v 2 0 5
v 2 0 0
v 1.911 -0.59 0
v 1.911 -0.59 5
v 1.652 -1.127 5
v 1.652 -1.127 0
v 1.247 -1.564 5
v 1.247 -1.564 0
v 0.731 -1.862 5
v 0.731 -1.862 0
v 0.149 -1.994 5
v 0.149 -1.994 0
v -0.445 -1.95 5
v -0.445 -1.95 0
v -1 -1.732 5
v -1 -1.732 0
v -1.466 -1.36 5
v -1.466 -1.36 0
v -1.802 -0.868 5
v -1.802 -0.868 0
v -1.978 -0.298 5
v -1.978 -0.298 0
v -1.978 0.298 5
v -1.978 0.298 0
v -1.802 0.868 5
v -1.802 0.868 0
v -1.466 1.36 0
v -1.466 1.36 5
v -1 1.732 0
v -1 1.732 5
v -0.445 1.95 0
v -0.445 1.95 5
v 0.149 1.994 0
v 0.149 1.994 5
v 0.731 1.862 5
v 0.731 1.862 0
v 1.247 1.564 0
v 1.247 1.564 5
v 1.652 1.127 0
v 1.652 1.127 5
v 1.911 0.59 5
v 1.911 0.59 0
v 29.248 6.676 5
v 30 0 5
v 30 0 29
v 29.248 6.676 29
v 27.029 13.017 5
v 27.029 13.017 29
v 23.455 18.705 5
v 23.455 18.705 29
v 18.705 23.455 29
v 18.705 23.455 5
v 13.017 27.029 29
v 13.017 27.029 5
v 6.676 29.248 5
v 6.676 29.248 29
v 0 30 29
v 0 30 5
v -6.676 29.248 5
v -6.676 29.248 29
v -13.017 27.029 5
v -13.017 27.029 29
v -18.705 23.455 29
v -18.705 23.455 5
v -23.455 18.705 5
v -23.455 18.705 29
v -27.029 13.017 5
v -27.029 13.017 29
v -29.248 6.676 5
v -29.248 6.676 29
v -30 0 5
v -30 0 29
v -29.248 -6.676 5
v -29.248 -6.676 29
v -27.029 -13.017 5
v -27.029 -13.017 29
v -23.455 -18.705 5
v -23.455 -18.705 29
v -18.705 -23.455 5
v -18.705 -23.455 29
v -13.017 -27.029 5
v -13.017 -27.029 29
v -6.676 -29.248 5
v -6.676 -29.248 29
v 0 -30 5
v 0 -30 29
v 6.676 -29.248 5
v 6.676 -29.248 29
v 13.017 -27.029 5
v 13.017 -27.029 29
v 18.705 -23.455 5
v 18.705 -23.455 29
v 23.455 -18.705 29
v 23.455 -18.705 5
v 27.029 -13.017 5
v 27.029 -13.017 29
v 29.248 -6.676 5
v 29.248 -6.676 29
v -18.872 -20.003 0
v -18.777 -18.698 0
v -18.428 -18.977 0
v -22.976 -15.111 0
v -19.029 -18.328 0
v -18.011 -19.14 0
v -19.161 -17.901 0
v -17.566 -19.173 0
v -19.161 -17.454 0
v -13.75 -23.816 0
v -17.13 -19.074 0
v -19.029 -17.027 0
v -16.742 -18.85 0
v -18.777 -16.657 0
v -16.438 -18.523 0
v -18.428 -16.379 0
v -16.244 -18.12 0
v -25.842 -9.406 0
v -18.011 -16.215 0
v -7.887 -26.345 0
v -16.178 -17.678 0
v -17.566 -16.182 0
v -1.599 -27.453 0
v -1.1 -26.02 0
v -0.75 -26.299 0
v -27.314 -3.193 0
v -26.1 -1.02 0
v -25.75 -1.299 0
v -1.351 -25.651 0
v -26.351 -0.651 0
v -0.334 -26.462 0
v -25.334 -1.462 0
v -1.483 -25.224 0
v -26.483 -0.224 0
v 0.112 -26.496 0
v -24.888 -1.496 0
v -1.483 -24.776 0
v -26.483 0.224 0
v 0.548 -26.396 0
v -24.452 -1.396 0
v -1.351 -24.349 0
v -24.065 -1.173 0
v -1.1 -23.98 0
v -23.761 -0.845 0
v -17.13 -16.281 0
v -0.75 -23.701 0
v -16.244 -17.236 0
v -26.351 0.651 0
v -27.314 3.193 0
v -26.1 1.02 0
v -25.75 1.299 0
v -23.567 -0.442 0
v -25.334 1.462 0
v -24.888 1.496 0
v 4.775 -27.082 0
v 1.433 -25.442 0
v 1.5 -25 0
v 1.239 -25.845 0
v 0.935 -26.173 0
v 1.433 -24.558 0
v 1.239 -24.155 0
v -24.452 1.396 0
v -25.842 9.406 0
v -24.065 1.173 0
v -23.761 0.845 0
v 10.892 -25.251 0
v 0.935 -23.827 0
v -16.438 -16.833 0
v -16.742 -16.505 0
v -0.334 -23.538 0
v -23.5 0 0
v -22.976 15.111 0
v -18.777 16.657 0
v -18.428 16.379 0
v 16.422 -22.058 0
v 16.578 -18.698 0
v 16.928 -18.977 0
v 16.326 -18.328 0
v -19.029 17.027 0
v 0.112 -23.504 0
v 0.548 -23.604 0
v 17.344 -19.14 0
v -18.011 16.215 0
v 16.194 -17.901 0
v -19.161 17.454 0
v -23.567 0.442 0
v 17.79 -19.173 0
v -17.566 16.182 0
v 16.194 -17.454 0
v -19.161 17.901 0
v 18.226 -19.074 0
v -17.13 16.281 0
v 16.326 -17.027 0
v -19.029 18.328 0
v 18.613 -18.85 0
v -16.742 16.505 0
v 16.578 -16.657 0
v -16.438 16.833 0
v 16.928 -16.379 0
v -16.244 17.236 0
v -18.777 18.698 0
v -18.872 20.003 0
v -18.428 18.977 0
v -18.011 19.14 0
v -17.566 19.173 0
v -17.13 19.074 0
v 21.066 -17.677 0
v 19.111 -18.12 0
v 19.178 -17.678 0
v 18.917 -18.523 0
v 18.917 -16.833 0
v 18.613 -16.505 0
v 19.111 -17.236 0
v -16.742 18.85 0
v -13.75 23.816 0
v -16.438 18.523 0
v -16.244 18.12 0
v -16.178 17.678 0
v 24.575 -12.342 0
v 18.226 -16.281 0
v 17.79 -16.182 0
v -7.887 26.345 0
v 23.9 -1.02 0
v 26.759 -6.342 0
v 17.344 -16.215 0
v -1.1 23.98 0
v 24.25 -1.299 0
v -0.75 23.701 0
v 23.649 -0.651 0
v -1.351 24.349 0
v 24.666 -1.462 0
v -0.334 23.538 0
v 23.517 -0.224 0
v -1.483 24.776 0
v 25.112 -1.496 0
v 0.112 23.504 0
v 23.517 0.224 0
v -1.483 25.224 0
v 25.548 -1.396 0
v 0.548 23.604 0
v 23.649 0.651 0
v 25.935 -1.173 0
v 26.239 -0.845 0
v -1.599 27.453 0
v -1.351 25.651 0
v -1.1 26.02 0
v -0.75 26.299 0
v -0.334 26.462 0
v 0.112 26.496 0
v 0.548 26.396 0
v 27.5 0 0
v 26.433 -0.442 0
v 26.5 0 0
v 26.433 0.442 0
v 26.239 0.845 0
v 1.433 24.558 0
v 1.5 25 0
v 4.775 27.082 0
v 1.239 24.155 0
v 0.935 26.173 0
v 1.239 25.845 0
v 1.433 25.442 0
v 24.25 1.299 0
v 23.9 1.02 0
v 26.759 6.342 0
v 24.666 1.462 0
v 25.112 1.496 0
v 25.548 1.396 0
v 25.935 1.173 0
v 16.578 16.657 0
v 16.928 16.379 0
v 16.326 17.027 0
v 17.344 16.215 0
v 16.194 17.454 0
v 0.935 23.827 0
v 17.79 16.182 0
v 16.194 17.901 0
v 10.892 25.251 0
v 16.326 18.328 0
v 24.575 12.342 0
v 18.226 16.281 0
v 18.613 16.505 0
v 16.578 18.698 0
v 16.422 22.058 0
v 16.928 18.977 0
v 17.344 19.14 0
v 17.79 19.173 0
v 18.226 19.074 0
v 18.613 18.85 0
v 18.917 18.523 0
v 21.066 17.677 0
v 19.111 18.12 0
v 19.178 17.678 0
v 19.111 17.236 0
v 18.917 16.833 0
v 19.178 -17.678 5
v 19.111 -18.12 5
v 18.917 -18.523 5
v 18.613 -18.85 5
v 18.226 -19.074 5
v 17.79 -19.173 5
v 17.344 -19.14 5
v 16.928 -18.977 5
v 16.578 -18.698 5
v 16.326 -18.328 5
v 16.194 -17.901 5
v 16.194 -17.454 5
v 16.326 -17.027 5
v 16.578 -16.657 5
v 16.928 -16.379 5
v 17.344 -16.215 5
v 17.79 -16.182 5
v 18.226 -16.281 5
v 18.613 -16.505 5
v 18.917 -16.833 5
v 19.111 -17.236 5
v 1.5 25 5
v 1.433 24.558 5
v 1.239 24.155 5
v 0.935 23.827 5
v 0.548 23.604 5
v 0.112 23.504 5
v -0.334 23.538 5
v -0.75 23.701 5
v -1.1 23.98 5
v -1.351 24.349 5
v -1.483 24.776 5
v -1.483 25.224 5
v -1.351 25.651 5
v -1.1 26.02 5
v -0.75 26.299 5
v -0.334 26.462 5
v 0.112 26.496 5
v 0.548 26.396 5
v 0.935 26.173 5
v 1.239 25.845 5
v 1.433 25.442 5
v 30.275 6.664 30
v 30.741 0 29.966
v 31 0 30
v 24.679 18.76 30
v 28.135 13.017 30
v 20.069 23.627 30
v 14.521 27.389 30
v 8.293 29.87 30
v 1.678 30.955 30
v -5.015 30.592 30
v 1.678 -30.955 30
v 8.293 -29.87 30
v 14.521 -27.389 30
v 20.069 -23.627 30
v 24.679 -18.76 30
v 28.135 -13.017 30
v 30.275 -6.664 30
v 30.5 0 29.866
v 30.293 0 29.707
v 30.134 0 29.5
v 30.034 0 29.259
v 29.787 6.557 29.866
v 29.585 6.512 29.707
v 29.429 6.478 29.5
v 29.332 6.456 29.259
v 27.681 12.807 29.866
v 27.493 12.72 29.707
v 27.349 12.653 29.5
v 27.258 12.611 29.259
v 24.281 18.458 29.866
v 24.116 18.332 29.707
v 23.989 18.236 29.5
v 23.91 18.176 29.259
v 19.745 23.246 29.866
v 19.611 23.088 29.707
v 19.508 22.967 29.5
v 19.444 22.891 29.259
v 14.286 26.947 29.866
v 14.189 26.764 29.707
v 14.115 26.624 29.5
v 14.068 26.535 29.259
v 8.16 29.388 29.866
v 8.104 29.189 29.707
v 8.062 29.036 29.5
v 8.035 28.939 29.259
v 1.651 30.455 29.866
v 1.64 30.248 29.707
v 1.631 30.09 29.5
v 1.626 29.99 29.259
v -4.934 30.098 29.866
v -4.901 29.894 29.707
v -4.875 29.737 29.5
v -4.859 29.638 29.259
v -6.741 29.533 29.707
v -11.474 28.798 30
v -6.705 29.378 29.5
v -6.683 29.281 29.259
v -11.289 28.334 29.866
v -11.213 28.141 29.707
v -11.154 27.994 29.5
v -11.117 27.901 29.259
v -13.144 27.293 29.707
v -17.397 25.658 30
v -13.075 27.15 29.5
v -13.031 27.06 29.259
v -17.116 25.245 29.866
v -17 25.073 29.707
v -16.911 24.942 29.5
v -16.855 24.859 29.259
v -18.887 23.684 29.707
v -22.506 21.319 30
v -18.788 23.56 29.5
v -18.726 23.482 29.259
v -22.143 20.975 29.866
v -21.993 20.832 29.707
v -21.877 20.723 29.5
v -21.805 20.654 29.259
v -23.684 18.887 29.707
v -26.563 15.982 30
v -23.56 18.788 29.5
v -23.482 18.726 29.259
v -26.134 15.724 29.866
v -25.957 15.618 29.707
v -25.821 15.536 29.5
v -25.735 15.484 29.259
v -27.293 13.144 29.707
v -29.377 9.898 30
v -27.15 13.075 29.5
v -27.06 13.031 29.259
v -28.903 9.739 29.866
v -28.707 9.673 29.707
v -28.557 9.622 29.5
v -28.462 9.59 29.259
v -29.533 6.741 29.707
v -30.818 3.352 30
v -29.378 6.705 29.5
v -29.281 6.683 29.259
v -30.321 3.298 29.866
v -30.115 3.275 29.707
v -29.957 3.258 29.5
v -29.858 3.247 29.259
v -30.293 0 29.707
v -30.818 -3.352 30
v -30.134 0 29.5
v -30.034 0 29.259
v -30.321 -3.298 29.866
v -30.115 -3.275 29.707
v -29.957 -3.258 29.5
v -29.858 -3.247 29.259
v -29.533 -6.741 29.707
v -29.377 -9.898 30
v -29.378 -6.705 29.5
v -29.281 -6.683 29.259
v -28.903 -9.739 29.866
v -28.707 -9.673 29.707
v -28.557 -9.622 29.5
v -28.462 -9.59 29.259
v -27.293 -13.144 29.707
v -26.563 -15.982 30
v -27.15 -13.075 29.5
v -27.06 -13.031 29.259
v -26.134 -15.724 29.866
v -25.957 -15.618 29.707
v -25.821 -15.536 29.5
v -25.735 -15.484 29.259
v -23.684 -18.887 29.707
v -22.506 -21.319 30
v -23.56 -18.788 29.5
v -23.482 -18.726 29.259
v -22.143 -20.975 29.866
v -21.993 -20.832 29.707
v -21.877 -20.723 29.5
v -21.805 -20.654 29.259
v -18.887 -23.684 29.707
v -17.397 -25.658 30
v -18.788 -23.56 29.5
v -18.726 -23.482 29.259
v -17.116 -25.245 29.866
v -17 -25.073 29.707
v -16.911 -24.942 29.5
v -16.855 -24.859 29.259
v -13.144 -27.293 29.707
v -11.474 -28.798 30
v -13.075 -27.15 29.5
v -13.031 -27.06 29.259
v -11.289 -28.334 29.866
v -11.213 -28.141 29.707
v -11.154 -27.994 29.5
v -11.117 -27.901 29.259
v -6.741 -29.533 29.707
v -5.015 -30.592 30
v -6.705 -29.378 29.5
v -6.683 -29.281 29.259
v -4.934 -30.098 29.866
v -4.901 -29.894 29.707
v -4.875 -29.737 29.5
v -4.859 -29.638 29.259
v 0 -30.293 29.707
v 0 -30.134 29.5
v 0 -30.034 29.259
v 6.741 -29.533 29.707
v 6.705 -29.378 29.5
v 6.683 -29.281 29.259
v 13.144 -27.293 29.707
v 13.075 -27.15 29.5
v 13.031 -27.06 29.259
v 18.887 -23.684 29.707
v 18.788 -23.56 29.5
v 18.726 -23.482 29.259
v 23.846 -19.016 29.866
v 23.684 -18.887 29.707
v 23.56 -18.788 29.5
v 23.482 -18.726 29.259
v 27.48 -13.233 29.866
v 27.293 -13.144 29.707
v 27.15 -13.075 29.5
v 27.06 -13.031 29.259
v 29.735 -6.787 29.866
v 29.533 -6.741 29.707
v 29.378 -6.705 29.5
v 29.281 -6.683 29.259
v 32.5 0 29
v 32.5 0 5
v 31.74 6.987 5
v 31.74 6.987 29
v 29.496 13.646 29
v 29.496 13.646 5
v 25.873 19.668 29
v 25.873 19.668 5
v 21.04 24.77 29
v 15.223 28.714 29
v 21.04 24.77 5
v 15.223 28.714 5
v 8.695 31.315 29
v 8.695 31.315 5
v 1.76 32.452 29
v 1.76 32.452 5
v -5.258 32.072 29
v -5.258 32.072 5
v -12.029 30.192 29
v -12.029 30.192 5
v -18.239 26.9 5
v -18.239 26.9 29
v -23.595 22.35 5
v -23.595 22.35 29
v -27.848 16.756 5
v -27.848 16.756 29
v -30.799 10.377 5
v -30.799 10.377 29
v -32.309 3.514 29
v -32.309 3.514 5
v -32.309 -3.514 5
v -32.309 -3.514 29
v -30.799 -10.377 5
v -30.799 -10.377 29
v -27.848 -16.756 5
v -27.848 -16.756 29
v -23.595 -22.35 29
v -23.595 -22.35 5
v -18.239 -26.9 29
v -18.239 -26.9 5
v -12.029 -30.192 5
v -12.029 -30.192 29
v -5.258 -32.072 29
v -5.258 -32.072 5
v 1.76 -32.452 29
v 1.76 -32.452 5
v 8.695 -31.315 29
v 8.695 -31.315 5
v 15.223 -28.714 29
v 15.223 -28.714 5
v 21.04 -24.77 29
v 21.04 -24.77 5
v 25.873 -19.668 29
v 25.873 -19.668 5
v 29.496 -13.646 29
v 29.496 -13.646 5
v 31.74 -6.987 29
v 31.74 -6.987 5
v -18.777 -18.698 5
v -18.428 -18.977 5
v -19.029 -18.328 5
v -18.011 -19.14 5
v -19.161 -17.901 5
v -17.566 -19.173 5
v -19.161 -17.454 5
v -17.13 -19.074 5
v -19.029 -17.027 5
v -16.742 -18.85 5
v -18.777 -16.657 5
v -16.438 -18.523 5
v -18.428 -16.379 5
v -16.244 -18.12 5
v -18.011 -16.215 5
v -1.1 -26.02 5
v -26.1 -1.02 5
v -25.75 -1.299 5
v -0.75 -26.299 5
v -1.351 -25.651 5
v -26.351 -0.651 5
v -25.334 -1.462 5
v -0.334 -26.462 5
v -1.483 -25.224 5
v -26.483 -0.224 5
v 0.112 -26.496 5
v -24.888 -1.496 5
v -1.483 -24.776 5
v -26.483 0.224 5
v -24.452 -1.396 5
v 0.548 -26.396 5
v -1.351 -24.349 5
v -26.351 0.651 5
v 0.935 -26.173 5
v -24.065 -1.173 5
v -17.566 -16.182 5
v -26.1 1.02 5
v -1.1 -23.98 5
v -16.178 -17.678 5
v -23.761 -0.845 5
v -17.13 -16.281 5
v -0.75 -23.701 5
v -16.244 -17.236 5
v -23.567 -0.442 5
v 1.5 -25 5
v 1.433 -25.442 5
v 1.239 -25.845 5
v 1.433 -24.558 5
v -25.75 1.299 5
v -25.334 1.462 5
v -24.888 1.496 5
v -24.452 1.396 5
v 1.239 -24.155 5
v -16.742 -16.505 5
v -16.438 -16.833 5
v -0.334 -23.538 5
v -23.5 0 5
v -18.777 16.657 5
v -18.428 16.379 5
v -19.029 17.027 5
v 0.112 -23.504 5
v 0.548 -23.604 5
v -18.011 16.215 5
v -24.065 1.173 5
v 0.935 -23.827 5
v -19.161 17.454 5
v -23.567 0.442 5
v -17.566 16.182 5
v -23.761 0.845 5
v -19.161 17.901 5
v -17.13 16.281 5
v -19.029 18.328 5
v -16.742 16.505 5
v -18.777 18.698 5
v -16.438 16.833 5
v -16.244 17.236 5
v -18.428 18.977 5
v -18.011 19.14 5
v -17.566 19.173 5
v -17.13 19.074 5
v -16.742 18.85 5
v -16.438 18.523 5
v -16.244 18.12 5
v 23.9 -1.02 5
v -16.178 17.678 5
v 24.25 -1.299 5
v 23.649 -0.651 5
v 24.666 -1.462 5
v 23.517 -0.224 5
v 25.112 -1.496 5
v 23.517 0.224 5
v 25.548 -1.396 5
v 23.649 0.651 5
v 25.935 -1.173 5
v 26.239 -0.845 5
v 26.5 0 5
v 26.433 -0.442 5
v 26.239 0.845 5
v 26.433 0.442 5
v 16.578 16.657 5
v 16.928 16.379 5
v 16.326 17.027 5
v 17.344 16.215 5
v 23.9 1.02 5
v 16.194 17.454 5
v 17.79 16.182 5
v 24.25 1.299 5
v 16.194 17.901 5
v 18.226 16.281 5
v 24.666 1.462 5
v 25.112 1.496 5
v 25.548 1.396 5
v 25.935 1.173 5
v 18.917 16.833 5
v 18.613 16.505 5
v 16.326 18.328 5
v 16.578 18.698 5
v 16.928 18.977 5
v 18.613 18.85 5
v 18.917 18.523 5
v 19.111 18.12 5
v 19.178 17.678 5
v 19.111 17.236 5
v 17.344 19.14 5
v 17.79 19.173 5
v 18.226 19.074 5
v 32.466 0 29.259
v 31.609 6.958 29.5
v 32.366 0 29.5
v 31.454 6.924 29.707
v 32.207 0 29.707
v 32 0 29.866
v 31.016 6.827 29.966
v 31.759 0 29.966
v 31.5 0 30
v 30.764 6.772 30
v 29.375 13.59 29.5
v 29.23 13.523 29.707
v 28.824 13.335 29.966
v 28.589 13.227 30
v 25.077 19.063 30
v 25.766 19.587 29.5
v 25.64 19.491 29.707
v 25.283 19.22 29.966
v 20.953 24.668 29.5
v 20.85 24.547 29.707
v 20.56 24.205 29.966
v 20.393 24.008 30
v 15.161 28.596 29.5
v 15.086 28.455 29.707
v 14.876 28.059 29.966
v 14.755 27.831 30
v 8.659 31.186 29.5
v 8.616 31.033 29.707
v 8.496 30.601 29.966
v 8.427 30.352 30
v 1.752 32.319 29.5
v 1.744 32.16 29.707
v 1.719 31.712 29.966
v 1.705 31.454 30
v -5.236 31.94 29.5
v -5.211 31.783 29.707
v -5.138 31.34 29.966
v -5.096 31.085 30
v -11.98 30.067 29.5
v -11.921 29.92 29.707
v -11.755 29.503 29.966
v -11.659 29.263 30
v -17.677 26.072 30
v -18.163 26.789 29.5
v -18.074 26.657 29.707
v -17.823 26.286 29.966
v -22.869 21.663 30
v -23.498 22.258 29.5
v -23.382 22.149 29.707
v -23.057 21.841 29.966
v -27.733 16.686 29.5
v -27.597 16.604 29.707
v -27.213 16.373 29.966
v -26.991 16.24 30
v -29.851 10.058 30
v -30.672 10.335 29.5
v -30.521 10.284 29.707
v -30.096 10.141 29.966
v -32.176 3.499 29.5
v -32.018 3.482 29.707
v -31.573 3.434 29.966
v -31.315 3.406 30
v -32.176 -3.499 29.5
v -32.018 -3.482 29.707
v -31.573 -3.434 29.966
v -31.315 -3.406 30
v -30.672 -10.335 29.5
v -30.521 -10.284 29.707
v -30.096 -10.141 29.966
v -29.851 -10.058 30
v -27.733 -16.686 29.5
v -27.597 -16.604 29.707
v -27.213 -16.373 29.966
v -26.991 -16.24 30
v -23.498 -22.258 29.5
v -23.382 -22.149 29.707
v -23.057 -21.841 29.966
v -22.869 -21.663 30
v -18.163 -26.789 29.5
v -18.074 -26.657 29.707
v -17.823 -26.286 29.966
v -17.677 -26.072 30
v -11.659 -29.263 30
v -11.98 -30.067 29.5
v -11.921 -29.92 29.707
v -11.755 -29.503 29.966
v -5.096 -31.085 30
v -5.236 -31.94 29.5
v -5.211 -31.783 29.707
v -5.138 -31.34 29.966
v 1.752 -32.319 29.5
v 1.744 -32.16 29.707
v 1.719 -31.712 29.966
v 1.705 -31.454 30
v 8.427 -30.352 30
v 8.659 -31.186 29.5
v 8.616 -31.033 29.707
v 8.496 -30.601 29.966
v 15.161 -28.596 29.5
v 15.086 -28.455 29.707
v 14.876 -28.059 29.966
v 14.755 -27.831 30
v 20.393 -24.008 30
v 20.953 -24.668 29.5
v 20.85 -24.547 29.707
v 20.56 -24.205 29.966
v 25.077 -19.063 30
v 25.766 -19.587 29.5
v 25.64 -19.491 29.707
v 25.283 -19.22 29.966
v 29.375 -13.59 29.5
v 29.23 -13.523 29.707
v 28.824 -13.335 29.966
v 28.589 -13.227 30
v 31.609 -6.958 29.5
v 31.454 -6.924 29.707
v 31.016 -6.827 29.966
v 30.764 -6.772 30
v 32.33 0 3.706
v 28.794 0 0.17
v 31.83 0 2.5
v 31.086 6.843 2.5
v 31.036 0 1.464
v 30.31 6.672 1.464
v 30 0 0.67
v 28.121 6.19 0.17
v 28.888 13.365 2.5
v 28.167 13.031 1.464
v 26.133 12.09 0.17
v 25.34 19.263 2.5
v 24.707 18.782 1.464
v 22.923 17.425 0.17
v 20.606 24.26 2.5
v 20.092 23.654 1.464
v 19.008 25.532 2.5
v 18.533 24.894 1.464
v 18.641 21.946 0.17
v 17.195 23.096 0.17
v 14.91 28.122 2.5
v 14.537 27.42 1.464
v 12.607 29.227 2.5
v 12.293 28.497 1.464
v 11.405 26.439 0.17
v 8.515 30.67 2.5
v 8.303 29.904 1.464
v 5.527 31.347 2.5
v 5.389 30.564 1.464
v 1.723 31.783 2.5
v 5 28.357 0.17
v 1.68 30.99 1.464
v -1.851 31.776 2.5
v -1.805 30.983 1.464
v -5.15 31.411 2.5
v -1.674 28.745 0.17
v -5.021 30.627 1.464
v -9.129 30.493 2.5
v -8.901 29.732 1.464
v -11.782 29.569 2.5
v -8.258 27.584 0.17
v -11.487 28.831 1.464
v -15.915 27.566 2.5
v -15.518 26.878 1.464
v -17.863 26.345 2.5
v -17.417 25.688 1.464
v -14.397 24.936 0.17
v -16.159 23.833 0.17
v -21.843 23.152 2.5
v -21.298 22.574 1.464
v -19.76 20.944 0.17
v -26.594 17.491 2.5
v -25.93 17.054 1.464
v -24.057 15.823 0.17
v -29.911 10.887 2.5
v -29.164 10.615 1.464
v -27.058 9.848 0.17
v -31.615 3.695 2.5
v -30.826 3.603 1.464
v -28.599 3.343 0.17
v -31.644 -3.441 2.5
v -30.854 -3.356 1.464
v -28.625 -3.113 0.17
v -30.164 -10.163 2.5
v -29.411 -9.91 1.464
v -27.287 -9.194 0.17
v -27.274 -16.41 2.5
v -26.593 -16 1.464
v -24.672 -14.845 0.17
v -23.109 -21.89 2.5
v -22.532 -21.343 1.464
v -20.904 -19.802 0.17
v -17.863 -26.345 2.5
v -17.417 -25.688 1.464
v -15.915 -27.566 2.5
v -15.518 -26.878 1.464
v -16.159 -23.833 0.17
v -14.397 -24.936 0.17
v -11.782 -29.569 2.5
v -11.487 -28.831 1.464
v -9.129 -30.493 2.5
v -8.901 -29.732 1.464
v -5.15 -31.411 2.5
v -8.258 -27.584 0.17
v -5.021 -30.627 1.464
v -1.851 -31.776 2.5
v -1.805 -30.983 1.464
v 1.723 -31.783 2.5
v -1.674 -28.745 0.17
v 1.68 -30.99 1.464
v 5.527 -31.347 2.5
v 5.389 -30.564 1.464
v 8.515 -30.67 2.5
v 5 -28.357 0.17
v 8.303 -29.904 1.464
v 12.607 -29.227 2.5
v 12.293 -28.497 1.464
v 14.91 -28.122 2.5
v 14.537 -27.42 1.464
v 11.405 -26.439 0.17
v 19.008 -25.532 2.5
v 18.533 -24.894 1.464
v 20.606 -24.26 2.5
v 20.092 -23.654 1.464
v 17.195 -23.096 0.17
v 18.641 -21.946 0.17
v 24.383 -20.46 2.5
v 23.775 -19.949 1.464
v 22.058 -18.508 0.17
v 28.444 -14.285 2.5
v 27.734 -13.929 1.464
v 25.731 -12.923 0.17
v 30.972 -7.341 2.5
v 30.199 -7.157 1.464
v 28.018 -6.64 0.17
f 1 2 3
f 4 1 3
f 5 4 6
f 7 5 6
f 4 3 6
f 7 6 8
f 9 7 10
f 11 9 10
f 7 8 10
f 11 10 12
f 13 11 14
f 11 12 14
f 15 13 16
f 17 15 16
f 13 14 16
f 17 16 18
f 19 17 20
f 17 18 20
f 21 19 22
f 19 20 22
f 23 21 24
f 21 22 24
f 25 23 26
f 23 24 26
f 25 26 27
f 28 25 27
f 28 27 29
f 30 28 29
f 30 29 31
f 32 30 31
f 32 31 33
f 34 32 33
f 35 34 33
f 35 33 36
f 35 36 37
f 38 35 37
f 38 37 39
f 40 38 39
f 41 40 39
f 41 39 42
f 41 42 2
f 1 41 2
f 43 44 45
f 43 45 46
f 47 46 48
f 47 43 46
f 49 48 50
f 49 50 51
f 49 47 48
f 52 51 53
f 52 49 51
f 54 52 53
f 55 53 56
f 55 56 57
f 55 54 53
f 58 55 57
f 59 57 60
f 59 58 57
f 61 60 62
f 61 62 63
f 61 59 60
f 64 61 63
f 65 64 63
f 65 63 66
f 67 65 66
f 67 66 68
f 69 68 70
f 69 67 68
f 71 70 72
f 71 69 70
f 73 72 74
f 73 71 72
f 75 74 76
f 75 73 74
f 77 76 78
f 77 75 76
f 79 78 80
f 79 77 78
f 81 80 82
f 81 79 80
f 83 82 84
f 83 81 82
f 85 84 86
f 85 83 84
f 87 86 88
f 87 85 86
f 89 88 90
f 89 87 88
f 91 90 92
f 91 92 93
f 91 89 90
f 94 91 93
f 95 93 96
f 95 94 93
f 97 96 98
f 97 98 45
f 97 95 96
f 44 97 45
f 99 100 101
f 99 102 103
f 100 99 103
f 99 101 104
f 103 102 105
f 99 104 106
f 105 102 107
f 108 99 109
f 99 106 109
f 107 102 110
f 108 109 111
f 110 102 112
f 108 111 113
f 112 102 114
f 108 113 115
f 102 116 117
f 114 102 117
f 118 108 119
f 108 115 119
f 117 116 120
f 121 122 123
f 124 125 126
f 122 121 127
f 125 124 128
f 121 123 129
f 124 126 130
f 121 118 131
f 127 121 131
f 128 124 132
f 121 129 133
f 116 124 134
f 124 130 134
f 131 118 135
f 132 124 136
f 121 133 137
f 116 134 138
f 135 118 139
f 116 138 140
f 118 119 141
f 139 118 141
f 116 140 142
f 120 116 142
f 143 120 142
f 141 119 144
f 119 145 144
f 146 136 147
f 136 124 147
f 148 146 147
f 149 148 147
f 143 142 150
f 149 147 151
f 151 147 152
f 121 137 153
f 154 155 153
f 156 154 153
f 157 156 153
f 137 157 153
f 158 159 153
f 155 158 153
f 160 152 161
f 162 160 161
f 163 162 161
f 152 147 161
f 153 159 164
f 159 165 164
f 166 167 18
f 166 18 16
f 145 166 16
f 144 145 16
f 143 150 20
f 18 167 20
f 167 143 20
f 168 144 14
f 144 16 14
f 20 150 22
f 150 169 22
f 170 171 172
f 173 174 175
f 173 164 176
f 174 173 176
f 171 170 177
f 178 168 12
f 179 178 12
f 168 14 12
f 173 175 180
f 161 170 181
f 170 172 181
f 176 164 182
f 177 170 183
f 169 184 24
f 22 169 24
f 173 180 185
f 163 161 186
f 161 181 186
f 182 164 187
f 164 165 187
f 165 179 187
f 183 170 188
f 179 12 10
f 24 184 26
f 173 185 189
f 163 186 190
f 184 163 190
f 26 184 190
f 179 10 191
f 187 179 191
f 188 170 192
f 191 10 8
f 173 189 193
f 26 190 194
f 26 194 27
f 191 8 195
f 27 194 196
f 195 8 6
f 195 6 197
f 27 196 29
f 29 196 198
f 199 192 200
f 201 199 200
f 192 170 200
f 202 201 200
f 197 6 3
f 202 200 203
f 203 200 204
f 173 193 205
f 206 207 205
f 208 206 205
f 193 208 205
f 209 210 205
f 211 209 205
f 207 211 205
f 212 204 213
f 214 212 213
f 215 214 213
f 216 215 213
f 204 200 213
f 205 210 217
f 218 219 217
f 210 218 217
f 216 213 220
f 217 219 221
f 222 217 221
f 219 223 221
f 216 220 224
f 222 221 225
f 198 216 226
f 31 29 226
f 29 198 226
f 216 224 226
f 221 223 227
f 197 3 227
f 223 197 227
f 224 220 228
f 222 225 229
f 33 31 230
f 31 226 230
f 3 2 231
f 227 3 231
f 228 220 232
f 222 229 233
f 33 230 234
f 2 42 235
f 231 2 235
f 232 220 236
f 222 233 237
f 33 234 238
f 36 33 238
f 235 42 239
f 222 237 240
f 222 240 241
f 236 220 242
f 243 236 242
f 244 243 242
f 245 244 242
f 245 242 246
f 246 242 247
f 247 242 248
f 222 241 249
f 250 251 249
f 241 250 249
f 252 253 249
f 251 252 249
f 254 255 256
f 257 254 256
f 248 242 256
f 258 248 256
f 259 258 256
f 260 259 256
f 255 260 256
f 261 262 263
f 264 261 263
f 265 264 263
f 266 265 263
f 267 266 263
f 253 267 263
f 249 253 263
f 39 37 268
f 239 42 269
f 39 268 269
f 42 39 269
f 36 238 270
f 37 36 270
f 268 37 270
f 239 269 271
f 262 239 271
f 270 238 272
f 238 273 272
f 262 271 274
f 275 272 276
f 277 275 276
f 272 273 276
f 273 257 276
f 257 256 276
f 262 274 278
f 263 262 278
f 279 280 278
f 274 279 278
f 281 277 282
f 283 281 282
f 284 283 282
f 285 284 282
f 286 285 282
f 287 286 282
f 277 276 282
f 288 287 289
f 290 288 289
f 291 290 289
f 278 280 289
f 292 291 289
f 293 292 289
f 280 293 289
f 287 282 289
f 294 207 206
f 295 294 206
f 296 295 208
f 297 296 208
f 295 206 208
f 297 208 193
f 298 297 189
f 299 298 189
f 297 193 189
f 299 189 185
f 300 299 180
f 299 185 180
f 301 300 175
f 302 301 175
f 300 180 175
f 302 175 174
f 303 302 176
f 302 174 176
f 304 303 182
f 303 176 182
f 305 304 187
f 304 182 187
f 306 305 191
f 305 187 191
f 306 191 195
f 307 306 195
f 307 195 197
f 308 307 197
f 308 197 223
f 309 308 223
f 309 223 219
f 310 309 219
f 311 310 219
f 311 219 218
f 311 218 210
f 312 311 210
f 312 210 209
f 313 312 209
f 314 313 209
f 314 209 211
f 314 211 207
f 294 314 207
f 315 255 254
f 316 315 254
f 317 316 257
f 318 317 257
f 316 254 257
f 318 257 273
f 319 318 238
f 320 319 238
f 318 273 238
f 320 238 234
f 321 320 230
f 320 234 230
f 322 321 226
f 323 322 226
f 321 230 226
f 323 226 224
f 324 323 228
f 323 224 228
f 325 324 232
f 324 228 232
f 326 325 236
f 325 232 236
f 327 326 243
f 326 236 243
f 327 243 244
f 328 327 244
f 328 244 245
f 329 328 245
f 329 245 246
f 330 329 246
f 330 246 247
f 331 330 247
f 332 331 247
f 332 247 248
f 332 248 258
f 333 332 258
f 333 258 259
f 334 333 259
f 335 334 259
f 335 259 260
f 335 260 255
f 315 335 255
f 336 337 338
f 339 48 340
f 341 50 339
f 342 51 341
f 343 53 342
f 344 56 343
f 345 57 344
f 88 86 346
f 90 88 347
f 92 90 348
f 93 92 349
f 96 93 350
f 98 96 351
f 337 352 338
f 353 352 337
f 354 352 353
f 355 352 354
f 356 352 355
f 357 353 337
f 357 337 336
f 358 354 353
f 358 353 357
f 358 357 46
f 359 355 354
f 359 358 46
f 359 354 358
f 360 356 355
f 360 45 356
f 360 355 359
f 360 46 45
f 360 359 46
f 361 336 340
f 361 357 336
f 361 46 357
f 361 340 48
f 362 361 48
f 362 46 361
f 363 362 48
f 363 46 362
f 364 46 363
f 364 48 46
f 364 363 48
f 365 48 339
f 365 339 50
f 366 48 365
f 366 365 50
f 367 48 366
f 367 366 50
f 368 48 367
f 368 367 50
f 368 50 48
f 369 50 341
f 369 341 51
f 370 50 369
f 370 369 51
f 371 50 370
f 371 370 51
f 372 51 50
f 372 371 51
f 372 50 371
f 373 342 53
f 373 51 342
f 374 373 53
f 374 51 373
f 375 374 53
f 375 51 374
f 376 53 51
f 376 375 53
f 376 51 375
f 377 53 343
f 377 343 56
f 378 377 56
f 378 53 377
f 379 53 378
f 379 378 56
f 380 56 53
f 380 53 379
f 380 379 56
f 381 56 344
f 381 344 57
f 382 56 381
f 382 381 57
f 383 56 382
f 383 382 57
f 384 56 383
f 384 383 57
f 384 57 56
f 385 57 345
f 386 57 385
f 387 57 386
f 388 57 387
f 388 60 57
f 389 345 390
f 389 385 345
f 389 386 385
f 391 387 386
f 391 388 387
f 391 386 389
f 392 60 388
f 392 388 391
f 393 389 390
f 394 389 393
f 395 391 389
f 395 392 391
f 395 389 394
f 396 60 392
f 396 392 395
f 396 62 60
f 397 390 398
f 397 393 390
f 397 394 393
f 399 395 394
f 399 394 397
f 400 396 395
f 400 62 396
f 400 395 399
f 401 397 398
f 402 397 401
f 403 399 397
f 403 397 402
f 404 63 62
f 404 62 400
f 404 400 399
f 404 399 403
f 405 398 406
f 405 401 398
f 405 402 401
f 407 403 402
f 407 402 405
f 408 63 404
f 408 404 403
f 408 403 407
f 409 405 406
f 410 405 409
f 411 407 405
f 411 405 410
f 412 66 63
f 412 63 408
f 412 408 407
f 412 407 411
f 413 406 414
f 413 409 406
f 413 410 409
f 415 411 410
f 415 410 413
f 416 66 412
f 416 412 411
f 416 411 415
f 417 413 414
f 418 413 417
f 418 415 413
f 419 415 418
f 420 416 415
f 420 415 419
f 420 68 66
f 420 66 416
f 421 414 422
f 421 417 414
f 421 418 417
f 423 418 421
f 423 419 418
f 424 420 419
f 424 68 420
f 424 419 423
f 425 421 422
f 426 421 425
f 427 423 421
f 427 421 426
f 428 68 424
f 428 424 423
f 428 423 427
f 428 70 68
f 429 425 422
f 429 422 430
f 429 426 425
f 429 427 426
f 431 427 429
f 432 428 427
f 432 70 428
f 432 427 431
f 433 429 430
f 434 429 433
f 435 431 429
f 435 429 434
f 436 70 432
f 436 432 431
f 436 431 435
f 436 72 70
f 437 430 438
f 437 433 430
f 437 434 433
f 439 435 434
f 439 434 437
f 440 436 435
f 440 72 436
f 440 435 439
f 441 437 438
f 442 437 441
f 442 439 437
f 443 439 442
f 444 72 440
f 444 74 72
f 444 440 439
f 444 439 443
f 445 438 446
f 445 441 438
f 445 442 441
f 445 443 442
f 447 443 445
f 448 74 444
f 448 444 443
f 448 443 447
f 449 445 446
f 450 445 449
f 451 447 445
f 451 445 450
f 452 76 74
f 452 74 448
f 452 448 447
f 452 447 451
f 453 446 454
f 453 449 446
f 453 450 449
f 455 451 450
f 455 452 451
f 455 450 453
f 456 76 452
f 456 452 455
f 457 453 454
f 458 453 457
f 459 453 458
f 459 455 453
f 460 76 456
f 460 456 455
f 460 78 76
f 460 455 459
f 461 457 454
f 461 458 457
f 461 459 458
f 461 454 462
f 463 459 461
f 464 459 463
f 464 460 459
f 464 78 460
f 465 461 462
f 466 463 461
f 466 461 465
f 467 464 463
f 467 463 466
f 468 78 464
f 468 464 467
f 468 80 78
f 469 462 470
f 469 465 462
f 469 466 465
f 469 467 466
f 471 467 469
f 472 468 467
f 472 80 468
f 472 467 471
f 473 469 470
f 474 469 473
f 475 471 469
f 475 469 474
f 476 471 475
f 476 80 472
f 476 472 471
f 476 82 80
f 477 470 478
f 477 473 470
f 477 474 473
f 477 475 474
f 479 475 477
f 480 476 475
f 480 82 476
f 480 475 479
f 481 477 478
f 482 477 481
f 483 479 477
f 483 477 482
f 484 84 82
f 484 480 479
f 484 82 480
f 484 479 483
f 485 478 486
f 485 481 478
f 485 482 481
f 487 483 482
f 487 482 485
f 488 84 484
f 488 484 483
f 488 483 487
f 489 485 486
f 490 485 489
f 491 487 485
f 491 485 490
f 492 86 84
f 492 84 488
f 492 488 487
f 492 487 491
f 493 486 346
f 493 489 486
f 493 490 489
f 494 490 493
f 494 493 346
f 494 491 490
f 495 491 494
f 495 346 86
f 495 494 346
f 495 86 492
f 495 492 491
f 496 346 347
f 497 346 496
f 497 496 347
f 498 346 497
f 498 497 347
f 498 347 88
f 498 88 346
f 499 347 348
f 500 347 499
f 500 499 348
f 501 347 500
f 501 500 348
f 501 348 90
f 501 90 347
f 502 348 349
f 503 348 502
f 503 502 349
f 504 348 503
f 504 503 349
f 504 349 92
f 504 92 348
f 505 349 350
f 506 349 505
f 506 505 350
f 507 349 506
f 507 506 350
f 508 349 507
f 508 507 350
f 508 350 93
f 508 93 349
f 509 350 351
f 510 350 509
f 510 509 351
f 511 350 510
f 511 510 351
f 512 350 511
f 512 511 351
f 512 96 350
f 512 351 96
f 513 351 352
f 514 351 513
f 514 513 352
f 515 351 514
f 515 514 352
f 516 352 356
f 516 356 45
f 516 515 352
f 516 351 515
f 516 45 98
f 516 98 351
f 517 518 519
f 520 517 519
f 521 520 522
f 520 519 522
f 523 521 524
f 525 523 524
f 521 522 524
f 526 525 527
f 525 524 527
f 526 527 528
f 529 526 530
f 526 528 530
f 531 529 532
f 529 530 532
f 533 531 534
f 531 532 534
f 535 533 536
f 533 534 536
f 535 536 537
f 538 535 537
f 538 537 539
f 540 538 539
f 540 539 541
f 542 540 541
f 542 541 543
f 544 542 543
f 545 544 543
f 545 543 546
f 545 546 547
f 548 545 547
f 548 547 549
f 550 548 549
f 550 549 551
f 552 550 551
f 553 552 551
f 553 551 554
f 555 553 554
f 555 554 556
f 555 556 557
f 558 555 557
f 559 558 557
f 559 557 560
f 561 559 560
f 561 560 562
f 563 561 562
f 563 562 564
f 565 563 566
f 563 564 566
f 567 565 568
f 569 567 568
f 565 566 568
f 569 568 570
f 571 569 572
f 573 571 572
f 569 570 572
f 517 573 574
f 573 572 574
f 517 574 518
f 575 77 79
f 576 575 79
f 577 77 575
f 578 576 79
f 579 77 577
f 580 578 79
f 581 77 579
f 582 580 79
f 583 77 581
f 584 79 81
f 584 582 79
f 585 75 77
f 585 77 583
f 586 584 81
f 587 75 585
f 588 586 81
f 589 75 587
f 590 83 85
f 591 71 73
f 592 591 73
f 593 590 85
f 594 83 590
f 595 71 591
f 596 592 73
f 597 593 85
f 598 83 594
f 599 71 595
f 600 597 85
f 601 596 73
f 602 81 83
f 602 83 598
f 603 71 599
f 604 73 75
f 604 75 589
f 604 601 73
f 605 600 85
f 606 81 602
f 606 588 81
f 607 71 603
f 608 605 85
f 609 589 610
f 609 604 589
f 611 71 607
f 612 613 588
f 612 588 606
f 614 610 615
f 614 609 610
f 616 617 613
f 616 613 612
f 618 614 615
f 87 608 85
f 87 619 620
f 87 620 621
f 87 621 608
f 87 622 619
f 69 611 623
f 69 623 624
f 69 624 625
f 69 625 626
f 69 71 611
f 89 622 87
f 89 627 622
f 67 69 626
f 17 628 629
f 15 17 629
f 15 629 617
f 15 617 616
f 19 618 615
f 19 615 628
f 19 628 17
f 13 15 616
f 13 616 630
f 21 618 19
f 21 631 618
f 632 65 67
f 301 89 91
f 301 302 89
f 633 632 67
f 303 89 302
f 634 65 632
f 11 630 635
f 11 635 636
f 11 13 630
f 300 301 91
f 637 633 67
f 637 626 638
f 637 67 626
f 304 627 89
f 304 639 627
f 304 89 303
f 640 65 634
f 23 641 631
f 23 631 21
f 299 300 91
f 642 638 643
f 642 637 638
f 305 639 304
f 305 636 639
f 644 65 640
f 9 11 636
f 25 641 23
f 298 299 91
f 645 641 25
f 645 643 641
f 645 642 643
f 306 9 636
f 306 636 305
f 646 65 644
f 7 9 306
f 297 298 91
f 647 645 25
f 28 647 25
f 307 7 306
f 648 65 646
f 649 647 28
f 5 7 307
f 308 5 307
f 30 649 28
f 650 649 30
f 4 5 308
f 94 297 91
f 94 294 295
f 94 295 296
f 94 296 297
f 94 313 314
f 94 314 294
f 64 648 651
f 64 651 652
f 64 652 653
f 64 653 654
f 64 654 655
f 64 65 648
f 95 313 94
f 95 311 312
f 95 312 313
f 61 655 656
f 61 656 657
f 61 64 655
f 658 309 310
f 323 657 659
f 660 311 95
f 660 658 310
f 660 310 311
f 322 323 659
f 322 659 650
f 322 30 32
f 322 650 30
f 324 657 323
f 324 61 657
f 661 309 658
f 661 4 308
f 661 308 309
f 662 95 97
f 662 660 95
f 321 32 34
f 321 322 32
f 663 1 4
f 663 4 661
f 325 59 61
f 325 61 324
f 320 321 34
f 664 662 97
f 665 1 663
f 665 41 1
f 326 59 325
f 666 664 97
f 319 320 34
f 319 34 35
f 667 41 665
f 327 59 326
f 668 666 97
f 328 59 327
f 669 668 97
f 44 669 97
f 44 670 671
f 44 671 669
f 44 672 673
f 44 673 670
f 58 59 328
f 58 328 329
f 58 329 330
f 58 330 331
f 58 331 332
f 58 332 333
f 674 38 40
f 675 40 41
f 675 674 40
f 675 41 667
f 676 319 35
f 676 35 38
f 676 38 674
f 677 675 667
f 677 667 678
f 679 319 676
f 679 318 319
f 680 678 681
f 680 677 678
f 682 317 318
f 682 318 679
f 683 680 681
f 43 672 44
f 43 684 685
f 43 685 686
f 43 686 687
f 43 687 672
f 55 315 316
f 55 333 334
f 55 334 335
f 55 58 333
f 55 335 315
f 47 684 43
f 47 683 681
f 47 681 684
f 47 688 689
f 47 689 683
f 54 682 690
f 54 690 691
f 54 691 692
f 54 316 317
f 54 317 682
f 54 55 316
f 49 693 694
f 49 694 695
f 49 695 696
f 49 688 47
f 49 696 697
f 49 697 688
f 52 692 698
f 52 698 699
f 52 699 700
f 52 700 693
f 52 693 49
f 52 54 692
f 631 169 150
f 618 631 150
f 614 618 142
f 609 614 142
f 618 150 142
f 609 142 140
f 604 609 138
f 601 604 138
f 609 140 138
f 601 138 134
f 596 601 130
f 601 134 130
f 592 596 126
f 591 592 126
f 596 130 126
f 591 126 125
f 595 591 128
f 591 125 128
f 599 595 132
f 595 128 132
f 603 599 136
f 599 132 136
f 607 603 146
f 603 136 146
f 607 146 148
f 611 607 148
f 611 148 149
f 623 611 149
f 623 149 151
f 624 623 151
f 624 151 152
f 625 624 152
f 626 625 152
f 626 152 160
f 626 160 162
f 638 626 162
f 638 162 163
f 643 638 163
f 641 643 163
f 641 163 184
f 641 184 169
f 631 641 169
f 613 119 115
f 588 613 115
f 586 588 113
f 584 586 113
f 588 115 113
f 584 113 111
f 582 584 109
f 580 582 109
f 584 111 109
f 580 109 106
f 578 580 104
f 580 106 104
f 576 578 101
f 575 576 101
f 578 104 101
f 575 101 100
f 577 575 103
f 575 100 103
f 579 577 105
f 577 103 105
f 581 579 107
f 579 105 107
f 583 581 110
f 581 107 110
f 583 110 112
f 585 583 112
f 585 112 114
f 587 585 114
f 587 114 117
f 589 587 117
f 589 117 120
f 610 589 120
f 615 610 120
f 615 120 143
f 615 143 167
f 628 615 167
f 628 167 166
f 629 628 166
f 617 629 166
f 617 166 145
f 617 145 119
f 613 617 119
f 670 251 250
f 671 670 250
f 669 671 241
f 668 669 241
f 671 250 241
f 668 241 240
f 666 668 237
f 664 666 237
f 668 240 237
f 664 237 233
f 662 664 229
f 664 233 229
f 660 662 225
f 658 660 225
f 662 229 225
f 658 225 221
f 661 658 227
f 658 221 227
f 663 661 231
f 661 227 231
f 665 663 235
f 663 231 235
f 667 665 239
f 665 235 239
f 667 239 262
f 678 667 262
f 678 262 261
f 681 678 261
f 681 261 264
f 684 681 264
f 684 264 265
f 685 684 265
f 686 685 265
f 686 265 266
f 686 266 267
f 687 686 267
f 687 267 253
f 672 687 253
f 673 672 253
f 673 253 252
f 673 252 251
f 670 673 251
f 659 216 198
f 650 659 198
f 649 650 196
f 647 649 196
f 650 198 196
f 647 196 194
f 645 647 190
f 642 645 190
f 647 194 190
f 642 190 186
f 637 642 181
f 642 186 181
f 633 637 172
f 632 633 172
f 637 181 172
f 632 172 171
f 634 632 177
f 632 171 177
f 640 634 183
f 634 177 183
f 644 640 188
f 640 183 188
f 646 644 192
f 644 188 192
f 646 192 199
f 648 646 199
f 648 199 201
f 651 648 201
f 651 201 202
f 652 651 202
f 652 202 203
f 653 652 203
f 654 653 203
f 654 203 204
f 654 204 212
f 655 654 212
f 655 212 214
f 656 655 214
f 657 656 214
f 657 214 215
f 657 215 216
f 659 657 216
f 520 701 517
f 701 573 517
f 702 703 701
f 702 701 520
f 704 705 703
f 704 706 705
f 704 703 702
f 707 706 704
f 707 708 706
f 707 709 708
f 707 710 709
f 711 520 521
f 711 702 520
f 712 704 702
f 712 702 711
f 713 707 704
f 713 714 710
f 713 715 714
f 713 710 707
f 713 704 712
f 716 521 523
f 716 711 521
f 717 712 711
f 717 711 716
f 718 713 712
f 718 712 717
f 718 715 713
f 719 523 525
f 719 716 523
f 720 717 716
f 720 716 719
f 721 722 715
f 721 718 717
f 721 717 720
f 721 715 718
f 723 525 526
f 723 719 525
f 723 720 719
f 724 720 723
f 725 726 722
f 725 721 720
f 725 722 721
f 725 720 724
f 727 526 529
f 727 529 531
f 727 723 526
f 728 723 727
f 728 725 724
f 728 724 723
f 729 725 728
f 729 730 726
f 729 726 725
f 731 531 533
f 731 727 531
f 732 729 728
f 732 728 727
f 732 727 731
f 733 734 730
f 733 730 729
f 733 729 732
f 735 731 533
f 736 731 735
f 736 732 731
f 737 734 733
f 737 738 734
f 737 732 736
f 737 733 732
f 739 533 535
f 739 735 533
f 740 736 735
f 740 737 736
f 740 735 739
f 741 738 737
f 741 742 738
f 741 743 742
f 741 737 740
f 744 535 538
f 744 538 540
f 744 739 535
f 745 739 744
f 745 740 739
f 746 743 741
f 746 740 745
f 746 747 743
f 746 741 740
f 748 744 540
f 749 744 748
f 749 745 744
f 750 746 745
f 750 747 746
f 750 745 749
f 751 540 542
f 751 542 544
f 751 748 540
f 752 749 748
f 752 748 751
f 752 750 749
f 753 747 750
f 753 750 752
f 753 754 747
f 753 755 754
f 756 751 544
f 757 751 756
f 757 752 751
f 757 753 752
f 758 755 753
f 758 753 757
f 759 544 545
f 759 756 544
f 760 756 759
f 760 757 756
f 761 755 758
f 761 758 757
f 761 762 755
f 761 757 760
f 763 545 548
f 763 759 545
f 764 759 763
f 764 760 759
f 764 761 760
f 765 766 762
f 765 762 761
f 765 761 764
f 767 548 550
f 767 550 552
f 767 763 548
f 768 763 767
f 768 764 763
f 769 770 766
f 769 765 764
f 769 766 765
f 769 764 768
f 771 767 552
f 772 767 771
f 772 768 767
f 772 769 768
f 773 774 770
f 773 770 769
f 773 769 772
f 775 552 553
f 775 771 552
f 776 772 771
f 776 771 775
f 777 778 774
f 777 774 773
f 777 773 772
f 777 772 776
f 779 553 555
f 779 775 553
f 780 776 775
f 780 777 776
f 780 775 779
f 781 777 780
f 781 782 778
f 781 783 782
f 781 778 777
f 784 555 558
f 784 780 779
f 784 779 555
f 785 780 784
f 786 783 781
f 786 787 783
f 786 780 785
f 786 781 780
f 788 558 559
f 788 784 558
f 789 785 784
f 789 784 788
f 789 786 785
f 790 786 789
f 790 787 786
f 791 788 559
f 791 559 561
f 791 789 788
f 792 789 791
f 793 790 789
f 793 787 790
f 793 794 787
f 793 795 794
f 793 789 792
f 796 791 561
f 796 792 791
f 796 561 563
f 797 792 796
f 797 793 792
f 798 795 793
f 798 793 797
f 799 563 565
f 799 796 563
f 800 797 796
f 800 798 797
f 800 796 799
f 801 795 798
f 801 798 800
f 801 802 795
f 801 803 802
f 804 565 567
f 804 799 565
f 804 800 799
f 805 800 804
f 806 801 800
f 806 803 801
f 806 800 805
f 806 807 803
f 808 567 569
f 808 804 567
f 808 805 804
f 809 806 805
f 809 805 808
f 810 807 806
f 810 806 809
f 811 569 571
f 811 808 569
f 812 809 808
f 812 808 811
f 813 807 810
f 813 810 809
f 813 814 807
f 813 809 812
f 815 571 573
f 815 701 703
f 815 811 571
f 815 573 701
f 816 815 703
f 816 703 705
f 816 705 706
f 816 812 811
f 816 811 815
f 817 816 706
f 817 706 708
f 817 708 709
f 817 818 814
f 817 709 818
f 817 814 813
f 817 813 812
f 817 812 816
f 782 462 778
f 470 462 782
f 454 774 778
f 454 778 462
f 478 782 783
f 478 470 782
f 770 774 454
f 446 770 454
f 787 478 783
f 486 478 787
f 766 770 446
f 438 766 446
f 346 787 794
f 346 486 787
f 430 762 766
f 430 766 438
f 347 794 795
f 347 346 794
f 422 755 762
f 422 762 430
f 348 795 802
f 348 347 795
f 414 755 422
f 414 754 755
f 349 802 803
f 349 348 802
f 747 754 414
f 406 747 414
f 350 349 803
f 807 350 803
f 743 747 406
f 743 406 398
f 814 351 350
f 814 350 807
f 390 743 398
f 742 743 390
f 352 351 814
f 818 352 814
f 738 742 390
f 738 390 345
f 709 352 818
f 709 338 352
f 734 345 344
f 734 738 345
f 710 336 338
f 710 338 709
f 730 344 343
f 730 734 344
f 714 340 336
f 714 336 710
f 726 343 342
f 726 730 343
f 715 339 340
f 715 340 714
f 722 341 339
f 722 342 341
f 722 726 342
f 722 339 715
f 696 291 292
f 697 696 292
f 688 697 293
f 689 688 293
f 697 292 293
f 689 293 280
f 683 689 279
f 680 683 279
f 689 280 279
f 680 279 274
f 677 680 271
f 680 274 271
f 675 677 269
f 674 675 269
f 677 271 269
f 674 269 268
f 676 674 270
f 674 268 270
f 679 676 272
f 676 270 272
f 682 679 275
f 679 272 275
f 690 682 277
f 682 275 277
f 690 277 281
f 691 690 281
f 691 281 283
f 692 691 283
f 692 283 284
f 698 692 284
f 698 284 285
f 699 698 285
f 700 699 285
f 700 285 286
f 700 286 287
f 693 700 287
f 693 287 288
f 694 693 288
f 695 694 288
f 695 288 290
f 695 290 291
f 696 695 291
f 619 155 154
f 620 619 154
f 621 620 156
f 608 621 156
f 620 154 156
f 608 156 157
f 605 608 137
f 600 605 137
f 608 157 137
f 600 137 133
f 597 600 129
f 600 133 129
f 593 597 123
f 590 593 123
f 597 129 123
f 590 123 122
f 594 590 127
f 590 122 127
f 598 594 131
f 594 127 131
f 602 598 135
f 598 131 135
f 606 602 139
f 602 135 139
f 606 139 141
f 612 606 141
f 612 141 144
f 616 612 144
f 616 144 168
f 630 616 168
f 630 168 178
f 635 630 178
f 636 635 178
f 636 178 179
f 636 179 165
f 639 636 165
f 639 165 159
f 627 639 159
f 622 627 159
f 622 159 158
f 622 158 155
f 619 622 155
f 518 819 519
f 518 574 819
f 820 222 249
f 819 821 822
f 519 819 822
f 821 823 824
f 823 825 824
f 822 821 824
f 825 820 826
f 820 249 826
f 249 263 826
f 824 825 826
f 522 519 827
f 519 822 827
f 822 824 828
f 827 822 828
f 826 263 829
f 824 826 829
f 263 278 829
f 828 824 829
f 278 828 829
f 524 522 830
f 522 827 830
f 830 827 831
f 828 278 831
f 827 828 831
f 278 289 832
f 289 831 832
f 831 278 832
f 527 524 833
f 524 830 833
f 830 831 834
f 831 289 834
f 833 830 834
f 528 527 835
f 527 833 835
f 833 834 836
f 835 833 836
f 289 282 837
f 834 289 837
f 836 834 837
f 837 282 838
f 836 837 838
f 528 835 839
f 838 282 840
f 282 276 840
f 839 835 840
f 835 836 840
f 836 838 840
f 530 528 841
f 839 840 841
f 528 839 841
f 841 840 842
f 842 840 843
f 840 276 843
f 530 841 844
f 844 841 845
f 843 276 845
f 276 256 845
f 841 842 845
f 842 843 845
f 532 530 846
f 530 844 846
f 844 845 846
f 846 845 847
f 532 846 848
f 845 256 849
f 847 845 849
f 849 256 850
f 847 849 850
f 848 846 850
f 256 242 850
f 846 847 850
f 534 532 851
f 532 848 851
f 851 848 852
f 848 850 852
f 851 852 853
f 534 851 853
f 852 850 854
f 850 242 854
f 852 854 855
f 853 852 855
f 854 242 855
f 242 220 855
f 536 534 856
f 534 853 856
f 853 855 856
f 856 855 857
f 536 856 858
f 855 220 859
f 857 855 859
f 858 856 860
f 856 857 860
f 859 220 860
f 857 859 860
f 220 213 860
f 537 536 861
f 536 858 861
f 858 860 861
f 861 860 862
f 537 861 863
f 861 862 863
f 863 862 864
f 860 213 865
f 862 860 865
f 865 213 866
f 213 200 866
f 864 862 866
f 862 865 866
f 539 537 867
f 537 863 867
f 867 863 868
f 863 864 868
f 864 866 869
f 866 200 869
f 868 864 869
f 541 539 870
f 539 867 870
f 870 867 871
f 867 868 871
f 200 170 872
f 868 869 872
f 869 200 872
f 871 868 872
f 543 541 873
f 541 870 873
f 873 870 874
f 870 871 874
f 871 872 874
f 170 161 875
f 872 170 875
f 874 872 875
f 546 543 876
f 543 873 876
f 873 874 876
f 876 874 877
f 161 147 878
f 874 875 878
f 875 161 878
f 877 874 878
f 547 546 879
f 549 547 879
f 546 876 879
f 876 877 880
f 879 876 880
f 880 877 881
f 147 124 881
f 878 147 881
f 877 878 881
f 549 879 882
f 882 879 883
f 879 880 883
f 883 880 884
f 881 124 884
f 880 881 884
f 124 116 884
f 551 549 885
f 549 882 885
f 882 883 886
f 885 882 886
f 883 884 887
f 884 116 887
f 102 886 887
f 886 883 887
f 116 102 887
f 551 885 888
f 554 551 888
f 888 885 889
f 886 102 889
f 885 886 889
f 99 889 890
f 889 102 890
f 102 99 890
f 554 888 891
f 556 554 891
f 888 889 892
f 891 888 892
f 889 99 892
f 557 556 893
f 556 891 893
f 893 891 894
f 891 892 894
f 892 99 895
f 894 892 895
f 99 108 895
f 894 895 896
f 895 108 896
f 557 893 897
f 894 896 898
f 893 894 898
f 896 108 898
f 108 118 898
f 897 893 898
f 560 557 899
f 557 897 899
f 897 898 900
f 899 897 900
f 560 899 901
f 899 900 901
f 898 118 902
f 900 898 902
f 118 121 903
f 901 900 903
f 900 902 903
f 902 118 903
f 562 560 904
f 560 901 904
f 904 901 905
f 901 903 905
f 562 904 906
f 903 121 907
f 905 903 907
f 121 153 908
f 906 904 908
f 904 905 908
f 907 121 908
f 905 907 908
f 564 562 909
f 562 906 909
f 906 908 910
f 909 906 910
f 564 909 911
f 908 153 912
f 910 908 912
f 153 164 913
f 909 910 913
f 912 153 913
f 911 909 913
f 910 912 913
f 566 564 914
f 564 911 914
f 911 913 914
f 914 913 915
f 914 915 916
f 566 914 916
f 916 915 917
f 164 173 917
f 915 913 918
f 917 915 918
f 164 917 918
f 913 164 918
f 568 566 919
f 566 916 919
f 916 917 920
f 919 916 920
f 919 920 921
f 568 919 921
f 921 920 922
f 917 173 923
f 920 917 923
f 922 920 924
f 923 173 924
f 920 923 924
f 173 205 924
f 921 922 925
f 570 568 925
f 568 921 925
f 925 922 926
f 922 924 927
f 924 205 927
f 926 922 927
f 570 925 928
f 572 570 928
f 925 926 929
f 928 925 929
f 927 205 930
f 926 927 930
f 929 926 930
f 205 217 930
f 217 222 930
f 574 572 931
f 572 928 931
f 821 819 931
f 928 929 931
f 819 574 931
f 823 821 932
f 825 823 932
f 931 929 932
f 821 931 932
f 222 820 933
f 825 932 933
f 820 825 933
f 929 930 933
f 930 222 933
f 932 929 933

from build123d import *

# Parameters (mm, degrees)
F0_R     = 32.5
F1_DEPTH = 5
F2_R     = 32.5
F2_R_2   = 30
F3_DEPTH = 25
F4_R     = 2
F5_DEPTH = 25
F6_R     = 1.5
F7_DEPTH = 25
F8_R     = 5
F9_R     = 1


with BuildPart() as f1:
    # F0 (on Top) → F1 (new body)
    with BuildSketch(Plane.XY):
        Circle(F0_R)
    extrude(amount=F1_DEPTH)

    # F2 (on face) → F3 (join)
    with BuildSketch(Plane.XY.offset(5)):
        Circle(F2_R)
        Circle(F2_R_2, mode=Mode.SUBTRACT)
    extrude(amount=F3_DEPTH)

    # F4 (on face) → F5 (cut)
    with BuildSketch(Plane(origin=(0, 0, 0), x_dir=(1, 0, 0), z_dir=(0, 0, -1))):
        Circle(F4_R)
    extrude(amount=-F5_DEPTH, mode=Mode.SUBTRACT)

    # F6 (on face) → F7 (cut)
    with BuildSketch(Plane(origin=(0, 0, 0), x_dir=(1, 0, 0), z_dir=(0, 0, -1))):
        with Locations((0, 25)):
            Circle(F6_R)
        with Locations((17.67767, 17.67767)):
            Circle(F6_R)
        with BuildLine():
            ThreePointArc((23.5, 0), (25, -1.5), (26.5, 0))
            ThreePointArc((26.5, 0), (25, 1.5), (23.5, 0))
        make_face()
        with Locations((17.67767, -17.67767)):
            Circle(F6_R)
        with Locations((0, -25)):
            Circle(F6_R)
        with Locations((-17.67767, -17.67767)):
            Circle(F6_R)
        with Locations((-17.67767, 17.67767)):
            Circle(F6_R)
        with Locations((-25, 0)):
            Circle(F6_R)
    extrude(amount=-F7_DEPTH, mode=Mode.SUBTRACT)

    # F8
    f8_edges = [f1.edges().sort_by_distance(p)[0] for p in [
        (-32.5, 0, 0),
    ]]
    fillet(f8_edges, radius=F8_R)

    # F9
    f9_edges = [f1.edges().sort_by_distance(p)[0] for p in [
        (-30, 0, 30),
        (-32.5, 0, 30),
    ]]
    fillet(f9_edges, radius=F9_R)


solid = f1.part
